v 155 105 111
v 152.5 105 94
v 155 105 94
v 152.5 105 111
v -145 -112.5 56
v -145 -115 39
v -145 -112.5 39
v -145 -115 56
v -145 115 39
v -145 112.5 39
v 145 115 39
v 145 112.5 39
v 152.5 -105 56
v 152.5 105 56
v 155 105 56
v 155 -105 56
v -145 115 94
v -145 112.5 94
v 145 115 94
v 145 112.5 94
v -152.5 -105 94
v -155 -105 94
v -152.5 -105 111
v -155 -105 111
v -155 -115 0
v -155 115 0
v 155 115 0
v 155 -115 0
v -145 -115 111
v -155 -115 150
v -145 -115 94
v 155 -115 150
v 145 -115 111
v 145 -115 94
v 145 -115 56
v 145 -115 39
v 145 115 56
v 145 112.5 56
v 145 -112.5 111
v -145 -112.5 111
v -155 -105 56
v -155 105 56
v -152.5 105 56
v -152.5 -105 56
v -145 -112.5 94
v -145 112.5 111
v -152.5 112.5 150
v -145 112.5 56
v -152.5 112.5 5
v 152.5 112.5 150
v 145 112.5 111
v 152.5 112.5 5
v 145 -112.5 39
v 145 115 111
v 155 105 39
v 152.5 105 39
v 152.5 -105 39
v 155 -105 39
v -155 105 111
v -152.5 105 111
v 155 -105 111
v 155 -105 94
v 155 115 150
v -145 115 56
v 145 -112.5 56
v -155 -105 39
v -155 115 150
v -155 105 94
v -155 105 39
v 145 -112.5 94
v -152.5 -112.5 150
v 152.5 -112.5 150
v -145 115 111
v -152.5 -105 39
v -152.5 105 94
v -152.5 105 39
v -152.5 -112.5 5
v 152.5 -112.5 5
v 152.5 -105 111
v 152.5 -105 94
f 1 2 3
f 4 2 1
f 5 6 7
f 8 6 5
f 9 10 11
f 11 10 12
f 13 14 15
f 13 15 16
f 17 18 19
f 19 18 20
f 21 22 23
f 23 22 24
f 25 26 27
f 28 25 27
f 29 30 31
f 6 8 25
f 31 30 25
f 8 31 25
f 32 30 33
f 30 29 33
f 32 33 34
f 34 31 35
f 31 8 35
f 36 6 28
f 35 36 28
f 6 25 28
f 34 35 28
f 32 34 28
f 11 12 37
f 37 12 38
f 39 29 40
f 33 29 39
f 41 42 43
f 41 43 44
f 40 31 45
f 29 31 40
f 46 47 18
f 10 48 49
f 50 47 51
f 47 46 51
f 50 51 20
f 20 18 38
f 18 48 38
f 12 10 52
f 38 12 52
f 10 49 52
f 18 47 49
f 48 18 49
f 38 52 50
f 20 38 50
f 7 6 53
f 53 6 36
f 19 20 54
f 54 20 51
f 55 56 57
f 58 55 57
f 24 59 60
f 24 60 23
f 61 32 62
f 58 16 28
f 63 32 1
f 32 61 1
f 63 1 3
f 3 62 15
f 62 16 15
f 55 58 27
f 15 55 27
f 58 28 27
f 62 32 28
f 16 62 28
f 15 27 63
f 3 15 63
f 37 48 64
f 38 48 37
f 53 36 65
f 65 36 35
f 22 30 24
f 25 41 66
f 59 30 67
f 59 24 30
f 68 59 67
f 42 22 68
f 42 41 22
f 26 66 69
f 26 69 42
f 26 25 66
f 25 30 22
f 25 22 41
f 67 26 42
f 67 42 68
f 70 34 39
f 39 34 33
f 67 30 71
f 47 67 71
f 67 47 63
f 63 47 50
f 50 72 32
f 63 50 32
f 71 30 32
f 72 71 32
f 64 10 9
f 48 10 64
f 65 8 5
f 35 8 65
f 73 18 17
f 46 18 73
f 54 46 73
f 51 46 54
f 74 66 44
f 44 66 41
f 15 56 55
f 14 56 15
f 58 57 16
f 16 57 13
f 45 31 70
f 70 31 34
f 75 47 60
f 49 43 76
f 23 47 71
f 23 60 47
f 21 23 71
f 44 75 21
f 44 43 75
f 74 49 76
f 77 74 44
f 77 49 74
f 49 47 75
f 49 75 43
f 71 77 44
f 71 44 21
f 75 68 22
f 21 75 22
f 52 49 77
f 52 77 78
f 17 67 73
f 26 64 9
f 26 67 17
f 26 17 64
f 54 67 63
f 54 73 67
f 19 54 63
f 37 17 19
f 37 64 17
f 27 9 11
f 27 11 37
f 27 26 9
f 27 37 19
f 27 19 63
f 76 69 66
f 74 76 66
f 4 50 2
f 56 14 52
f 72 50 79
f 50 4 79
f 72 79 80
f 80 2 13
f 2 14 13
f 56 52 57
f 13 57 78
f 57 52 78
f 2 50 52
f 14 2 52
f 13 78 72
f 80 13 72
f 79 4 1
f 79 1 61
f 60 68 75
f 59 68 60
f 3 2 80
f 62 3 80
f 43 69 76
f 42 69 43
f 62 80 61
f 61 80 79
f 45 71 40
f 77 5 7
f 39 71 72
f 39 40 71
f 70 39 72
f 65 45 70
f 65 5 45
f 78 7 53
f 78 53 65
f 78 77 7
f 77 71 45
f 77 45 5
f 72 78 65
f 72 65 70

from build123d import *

# Parameters (mm, degrees)
F0_W     = 310
F0_H     = 230
F1_DEPTH = 5
F2_W     = 310
F2_H     = 230
F2_W_2   = 305
F2_H_2   = 225
F3_DEPTH = 150
F4_W     = 210
F4_H     = 17
F5_DEPTH = 310.001
F6_W     = 290
F6_H     = 17
F7_DEPTH = 230.001


with BuildPart() as f1:
    # F0 (on Top) → F1 (new body)
    with BuildSketch(Plane.XY):
        Rectangle(F0_W, F0_H)
    extrude(amount=F1_DEPTH)

    # F2 (on face) → F3 (join)
    with BuildSketch(Plane(origin=(0, 0, 0), x_dir=(1, 0, 0), z_dir=(0, 0, -1))):
        Rectangle(F2_W, F2_H)
        Rectangle(F2_W_2, F2_H_2, mode=Mode.SUBTRACT)
    extrude(amount=-F3_DEPTH)

    # F4 (on face) → F5 (cut, through all)
    with BuildSketch(Plane(origin=(-155, 0, 0), x_dir=(0, -1, 0), z_dir=(-1, 0, 0))):
        with Locations((0, 102.5)):
            Rectangle(F4_W, F4_H)
        with Locations((0, 47.5)):
            Rectangle(F4_W, F4_H)
    extrude(amount=-F5_DEPTH, mode=Mode.SUBTRACT)

    # F6 (on face) → F7 (cut, through all)
    with BuildSketch(Plane.XZ.offset(115)):
        with Locations((0, 102.5)):
            Rectangle(F6_W, F6_H)
        with Locations((0, 47.5)):
            Rectangle(F6_W, F6_H)
    extrude(amount=-F7_DEPTH, mode=Mode.SUBTRACT)


solid = f1.part
